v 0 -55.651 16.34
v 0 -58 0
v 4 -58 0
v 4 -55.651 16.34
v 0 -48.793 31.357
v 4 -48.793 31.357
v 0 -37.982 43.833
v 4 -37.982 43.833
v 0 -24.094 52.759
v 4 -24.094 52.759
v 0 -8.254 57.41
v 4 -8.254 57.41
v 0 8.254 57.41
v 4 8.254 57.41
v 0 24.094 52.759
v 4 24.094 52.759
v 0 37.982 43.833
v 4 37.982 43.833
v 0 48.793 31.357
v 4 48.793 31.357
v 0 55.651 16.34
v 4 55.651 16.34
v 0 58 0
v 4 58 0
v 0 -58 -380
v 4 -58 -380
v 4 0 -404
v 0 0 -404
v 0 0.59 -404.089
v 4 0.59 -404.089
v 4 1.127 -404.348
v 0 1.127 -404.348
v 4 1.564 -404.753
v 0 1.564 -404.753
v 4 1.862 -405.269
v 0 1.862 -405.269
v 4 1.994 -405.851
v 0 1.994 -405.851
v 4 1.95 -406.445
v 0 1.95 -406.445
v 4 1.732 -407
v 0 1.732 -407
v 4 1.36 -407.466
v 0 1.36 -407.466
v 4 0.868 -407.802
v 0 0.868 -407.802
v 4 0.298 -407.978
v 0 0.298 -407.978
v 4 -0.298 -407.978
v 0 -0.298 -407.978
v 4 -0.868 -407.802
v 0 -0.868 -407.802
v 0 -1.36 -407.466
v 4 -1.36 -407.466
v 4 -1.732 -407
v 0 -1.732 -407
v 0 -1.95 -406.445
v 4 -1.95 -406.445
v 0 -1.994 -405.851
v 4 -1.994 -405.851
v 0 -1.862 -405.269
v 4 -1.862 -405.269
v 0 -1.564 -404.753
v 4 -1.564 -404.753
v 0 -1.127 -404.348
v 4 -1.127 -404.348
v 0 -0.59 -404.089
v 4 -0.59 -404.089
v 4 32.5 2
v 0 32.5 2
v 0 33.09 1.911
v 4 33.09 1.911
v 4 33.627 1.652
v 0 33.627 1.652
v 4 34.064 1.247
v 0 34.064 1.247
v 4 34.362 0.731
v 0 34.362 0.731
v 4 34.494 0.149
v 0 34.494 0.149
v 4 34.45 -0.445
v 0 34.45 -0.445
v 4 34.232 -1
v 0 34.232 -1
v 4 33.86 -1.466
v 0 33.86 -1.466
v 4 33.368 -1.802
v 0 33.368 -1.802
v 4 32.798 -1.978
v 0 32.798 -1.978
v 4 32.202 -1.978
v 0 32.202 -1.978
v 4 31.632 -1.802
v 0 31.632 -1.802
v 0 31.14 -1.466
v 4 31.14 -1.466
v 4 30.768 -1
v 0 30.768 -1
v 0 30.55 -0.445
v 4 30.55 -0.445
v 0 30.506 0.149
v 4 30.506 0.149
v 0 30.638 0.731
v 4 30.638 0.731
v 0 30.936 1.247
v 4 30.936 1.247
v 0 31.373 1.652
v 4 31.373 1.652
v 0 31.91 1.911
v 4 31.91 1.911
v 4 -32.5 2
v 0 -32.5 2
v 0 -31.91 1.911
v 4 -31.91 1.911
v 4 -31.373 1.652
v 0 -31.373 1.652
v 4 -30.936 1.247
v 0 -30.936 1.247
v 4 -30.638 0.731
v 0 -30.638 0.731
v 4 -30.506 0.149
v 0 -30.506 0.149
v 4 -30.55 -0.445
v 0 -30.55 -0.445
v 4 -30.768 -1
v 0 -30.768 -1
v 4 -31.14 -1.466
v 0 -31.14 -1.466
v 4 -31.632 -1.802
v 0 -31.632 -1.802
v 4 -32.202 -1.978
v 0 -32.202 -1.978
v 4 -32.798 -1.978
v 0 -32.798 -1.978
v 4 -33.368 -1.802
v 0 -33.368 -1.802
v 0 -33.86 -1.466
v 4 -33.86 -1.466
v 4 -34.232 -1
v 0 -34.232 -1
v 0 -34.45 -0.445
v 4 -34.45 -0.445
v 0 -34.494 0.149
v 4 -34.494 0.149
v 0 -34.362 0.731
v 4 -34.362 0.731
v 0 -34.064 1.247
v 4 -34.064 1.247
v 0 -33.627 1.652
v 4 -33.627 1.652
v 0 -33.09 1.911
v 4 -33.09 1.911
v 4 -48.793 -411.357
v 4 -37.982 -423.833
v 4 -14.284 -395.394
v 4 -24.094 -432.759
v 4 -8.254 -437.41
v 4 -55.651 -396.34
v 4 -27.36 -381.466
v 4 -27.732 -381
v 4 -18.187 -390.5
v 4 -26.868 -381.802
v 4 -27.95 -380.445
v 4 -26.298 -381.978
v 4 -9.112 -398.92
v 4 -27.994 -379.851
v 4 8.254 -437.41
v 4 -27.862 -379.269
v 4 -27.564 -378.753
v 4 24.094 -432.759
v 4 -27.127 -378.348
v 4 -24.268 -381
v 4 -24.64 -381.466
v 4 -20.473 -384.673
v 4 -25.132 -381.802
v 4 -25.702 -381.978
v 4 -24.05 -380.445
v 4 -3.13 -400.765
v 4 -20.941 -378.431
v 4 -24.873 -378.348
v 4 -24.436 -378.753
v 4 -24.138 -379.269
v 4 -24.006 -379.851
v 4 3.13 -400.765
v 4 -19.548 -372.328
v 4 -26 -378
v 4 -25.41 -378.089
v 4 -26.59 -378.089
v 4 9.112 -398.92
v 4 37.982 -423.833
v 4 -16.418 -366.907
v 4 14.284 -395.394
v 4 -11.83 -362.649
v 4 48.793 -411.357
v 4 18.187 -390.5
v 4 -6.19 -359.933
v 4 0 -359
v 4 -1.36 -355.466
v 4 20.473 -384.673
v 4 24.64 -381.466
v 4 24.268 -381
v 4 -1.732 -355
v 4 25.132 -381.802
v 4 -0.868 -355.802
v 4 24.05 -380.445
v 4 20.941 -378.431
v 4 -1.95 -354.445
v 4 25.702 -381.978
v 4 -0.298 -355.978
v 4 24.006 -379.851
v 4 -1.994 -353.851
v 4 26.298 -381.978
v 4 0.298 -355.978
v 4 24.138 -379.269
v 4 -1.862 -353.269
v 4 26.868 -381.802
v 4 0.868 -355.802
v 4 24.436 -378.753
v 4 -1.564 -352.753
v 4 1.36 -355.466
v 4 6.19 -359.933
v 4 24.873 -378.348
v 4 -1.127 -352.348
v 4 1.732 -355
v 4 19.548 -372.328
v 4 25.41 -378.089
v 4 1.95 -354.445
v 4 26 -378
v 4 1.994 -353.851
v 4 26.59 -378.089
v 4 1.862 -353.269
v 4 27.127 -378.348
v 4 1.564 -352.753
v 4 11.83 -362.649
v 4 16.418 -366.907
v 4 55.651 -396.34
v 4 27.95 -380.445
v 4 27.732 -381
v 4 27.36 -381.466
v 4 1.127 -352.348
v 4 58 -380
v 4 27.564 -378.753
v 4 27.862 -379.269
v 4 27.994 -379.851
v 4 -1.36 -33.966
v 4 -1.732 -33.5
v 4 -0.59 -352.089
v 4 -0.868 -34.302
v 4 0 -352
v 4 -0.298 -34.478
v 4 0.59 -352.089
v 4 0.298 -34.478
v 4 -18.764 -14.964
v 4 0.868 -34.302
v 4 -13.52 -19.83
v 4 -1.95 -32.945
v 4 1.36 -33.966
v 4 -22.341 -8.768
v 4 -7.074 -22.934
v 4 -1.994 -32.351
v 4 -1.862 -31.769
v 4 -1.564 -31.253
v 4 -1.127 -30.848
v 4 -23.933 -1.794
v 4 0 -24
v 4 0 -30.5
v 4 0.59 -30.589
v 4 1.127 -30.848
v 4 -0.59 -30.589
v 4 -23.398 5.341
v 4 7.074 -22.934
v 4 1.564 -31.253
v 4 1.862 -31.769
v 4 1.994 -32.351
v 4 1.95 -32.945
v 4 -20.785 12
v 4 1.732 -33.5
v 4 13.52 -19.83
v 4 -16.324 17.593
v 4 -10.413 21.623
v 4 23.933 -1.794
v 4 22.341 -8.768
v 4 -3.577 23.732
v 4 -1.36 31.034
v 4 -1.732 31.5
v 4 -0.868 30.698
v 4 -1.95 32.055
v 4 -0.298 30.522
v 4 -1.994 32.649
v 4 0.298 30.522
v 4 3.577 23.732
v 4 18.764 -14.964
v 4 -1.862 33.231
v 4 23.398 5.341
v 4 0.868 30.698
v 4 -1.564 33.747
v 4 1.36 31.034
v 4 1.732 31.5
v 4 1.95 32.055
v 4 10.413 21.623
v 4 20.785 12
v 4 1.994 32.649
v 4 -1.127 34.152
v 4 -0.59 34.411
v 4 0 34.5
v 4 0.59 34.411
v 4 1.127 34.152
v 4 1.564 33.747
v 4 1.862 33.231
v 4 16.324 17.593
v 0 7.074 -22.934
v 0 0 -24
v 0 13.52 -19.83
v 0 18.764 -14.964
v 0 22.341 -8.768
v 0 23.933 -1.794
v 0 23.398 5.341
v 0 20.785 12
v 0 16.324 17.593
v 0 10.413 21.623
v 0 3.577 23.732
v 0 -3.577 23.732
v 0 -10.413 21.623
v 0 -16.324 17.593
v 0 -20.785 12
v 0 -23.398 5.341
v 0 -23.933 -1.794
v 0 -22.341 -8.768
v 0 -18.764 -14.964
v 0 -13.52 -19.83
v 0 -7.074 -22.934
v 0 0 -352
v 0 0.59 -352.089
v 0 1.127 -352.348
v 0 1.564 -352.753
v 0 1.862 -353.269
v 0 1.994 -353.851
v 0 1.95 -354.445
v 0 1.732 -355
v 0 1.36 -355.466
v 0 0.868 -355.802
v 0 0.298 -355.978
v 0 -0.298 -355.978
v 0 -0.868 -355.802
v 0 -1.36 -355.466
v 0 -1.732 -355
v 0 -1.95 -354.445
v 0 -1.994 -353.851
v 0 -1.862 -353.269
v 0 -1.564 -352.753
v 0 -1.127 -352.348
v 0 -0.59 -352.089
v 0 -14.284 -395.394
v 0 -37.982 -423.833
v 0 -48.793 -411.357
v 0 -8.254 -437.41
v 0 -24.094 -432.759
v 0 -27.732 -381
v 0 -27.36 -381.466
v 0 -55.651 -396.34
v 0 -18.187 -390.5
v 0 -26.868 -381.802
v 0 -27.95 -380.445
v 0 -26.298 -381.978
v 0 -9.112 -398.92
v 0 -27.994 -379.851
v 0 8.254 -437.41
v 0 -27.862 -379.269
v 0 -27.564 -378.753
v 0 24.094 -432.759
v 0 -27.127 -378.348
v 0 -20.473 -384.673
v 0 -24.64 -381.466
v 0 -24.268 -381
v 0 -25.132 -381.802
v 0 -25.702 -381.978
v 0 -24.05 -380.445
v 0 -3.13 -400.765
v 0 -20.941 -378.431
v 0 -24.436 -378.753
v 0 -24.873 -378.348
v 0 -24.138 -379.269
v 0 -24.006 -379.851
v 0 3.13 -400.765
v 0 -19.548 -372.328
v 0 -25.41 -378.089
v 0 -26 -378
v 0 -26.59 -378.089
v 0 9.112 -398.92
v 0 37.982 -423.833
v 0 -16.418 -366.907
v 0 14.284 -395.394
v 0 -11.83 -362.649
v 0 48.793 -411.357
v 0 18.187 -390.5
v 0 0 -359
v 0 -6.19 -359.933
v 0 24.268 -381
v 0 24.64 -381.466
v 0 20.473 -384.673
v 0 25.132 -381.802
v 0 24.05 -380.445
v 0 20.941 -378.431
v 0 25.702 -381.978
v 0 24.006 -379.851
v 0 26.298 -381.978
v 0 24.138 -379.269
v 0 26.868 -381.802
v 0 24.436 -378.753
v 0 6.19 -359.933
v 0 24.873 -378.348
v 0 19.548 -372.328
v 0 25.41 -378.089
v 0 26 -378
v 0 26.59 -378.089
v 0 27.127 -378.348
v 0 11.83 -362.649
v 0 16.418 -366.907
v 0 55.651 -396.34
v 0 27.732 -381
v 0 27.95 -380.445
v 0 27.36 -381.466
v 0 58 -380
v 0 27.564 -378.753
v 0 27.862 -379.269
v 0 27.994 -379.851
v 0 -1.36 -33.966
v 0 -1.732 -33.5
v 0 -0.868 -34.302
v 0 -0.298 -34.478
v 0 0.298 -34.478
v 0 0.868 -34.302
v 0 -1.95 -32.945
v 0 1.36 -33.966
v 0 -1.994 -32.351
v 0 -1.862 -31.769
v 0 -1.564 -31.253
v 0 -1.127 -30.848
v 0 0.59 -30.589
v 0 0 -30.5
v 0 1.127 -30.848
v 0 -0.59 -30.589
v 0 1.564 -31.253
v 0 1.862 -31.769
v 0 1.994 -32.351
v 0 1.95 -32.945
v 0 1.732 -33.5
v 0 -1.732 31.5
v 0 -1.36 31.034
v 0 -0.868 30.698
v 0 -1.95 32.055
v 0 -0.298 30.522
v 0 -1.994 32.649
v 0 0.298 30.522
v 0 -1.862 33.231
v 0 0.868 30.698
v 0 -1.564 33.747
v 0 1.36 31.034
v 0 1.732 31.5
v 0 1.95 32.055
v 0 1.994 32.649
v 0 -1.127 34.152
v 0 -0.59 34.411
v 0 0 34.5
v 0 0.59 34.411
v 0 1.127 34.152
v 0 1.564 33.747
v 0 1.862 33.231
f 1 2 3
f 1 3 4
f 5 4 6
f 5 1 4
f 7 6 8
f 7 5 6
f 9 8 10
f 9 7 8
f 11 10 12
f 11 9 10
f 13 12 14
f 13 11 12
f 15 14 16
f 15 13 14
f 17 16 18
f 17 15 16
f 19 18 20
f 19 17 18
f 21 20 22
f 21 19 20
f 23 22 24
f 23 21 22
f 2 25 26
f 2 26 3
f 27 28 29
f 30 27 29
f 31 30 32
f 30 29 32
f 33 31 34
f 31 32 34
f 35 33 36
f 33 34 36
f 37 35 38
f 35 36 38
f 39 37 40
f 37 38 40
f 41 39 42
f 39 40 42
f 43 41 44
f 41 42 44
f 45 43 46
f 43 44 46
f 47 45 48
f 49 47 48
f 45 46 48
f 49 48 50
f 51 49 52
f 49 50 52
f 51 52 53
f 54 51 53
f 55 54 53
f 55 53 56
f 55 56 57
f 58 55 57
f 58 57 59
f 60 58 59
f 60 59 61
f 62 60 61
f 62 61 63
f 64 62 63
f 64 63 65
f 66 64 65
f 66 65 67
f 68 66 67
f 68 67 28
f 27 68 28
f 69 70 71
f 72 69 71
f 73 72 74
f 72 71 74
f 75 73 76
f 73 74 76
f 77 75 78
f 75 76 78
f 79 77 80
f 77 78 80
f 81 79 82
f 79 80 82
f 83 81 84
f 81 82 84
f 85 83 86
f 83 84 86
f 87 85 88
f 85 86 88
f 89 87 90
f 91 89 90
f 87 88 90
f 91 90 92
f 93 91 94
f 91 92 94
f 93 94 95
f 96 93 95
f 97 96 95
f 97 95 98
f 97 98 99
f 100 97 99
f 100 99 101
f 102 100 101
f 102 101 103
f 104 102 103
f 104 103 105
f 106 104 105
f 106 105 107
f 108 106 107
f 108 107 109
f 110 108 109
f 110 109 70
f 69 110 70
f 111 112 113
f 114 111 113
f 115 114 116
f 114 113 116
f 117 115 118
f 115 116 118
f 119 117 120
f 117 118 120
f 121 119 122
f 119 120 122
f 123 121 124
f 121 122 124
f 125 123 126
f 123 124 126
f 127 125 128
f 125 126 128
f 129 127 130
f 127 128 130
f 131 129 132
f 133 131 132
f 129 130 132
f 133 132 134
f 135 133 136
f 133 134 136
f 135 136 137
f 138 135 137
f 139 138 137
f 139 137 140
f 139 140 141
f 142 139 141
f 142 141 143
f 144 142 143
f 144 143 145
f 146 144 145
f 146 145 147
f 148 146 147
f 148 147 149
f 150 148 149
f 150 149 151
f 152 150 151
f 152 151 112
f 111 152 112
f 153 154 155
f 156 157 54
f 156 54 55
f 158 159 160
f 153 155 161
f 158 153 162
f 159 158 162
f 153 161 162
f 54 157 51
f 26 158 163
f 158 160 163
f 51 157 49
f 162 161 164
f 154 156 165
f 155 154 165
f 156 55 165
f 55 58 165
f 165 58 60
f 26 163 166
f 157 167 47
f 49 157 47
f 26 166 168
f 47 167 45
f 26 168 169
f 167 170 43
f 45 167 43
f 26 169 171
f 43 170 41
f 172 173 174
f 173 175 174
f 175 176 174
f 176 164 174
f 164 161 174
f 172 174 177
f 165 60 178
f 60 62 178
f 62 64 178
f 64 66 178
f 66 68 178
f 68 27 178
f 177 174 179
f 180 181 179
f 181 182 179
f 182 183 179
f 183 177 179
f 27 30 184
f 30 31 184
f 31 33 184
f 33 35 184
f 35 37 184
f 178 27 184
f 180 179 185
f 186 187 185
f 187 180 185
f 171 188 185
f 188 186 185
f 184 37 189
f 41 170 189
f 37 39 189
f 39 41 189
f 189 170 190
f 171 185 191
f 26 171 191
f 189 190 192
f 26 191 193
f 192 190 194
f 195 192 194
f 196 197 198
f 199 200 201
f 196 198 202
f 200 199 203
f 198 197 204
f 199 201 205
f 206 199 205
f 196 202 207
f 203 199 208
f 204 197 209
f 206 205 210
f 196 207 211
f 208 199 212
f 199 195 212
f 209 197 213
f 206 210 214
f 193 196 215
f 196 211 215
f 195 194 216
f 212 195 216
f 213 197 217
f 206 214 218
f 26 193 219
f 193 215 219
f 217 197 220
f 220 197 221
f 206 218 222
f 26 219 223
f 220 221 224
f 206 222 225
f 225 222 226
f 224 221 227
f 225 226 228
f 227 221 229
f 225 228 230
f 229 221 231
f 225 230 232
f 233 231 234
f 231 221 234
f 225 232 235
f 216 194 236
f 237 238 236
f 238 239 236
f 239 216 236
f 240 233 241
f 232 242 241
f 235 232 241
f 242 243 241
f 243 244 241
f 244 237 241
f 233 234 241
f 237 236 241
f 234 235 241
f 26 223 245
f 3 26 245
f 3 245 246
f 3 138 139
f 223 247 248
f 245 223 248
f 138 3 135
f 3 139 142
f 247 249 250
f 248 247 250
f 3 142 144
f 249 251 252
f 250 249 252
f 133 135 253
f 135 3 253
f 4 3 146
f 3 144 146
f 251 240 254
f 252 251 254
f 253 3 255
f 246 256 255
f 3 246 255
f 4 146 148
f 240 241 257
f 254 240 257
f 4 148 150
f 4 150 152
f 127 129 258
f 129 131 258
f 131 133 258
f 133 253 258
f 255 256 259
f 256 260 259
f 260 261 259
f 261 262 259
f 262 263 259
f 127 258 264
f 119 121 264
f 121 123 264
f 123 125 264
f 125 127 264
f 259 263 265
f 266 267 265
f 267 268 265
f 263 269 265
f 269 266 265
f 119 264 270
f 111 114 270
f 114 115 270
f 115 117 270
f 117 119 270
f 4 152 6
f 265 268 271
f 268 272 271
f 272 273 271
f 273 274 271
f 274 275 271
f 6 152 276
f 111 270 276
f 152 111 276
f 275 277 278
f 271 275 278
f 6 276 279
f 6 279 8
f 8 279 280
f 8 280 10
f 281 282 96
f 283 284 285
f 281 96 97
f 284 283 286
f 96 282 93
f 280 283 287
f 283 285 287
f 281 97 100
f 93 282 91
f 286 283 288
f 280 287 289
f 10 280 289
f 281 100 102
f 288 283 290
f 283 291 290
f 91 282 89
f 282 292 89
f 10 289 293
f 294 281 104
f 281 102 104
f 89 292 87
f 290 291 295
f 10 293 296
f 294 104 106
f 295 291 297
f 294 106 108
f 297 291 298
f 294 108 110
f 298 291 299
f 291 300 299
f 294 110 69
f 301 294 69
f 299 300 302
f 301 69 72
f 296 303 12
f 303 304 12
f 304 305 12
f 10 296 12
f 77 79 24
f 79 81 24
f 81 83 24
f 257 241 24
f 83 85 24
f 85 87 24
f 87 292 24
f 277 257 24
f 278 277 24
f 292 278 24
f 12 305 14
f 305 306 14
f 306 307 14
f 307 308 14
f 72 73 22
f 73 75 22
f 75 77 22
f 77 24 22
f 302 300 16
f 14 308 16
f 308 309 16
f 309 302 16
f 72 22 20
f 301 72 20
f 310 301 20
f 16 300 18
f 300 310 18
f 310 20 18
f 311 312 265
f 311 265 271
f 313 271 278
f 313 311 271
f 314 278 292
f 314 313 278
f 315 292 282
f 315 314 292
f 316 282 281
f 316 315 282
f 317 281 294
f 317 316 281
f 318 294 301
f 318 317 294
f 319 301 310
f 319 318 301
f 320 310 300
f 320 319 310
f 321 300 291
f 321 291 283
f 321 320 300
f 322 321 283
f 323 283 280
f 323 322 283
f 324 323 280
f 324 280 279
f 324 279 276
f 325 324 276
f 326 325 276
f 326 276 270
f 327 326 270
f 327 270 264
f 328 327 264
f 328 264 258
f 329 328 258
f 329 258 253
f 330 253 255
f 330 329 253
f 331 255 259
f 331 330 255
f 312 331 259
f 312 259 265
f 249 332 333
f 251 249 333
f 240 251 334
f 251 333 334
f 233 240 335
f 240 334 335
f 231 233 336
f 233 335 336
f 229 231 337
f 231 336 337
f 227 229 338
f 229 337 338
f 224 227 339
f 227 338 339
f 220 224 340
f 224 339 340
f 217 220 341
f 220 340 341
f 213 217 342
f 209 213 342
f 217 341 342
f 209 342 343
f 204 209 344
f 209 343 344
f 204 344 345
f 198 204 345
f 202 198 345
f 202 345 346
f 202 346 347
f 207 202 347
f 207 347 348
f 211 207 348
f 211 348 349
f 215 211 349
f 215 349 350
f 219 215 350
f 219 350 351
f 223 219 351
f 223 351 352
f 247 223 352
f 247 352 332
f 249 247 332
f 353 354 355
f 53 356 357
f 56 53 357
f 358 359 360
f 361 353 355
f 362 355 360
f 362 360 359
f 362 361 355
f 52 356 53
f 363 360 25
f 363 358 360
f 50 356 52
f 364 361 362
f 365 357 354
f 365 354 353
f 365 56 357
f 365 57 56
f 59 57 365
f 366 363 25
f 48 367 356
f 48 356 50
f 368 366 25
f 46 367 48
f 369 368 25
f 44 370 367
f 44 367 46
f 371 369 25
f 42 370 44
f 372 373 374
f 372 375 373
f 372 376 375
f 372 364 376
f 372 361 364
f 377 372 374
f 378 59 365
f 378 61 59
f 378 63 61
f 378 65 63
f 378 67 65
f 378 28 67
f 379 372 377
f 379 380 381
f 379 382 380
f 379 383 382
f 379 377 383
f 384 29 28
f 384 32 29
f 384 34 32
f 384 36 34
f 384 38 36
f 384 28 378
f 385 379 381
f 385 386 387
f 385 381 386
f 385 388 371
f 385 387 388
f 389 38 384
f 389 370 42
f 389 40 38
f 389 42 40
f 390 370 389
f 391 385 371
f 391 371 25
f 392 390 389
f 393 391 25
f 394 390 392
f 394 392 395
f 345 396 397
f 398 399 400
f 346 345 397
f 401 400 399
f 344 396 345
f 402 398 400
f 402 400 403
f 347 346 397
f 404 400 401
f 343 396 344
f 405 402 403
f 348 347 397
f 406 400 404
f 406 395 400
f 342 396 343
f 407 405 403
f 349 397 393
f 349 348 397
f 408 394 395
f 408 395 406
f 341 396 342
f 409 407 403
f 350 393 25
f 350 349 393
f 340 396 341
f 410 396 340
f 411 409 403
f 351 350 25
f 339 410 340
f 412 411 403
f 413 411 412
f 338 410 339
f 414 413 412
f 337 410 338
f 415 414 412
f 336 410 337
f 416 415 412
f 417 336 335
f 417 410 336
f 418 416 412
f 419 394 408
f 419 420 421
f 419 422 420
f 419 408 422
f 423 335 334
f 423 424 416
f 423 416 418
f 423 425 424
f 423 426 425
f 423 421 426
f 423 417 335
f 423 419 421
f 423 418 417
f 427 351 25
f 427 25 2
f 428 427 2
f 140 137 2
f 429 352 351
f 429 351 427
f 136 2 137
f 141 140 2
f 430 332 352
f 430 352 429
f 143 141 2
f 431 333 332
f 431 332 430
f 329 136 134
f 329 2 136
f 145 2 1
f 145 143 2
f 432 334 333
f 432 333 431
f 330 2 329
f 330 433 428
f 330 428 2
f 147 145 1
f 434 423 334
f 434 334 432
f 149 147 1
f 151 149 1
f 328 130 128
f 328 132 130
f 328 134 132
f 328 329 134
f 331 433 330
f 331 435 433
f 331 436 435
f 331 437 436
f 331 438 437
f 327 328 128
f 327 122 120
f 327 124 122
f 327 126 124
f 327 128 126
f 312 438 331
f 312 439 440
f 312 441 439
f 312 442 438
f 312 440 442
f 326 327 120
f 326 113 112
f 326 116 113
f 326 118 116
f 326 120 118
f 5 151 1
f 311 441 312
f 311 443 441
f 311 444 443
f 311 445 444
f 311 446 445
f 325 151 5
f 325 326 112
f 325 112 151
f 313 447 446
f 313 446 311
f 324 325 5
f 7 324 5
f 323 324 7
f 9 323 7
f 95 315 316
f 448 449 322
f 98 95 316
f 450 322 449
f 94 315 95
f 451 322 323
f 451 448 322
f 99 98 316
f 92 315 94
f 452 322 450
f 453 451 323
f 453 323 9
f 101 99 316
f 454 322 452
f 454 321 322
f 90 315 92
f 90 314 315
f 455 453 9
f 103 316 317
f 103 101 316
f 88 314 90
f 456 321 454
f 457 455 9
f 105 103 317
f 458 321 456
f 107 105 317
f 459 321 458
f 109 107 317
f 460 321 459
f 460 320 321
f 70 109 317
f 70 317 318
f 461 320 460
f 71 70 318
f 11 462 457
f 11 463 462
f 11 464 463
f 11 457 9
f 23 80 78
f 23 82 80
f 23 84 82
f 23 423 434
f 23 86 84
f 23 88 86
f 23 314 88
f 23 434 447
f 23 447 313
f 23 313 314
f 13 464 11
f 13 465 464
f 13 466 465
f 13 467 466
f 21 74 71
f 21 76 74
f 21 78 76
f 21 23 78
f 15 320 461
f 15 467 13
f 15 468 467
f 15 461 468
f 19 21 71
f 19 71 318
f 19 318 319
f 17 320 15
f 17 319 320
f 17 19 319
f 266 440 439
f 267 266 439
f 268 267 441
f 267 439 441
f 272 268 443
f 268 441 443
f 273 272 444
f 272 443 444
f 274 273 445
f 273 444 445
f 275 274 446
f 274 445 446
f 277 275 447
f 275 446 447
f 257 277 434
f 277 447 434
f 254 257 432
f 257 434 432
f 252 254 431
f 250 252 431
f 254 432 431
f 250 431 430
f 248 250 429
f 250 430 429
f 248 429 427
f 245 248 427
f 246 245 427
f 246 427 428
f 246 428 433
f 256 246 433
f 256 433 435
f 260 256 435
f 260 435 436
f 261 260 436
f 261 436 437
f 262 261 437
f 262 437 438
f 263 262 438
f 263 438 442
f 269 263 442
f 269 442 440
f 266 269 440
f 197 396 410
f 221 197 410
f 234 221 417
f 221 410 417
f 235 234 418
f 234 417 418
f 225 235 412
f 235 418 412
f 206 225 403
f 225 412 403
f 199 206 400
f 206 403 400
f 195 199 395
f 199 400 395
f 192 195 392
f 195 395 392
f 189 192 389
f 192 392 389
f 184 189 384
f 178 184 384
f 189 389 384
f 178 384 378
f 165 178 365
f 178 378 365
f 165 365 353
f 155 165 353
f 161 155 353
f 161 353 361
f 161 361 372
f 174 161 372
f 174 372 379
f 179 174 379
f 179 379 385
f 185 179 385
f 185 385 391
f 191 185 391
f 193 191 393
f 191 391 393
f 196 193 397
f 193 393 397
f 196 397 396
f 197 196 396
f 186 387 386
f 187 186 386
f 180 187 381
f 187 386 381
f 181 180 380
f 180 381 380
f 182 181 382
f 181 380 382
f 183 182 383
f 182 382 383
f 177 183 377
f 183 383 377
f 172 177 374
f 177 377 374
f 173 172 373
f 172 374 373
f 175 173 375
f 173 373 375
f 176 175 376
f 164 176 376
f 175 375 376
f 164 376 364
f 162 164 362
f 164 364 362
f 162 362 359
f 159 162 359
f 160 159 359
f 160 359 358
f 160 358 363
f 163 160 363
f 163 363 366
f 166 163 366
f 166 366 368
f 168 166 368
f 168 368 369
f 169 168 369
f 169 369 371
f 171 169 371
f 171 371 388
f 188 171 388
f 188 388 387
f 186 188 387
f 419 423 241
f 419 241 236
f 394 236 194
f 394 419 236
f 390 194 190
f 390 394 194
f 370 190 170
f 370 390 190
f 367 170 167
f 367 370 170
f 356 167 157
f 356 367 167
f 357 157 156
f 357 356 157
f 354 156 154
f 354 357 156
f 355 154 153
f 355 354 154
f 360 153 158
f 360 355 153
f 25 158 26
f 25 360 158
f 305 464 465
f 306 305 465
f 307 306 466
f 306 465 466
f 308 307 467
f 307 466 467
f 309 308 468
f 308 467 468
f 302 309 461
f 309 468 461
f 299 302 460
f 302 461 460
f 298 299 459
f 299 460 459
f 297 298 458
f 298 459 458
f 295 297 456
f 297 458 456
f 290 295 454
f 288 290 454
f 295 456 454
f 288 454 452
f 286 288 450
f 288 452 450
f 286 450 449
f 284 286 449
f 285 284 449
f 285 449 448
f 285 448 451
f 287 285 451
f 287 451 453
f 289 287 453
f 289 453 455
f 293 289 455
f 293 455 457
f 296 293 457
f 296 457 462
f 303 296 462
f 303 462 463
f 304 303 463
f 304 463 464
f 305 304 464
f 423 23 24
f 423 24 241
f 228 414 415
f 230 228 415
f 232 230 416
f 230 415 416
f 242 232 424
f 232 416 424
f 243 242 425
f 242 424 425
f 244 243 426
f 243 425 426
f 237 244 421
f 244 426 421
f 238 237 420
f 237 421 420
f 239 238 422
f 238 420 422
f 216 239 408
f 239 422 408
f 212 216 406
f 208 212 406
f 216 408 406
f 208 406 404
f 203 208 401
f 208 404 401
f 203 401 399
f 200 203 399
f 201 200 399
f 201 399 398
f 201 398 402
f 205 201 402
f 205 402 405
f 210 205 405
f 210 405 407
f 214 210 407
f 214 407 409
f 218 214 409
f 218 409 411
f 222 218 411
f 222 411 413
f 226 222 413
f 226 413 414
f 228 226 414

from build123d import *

# Parameters (mm, degrees)
SKETCH1_R           = 24
BOSS_EXTRUDE1_DEPTH = 4
SKETCH4_R           = 2
CUT_EXTRUDE3_DEPTH  = 442.841600576
SKETCH7_R           = 24
SKETCH7_R_2         = 21
BOSS_EXTRUDE3_DEPTH = 4
SKETCH8_R           = 2
CUT_EXTRUDE5_DEPTH  = 442.841600576


with BuildPart() as part:
    # Sketch1 → Boss-Extrude1 (new body)
    with BuildSketch(Plane(origin=(0, 0, 0), x_dir=(0, 0, -1), z_dir=(1, 0, 0))):
        with BuildLine():
            Line((0, 58), (380, 58))
            ThreePointArc((380, 58), (438, 0), (380, -58))
            Line((380, -58), (0, -58))
            ThreePointArc((0, -58), (-58, 0), (0, 58))
        make_face()
        Circle(SKETCH1_R, mode=Mode.SUBTRACT)
        with Locations((380, 0)):
            Circle(SKETCH1_R, mode=Mode.SUBTRACT)
    extrude(amount=BOSS_EXTRUDE1_DEPTH)

    # Sketch4 → Cut-Extrude3 (cut, through all)
    with BuildSketch(Plane.ZY):
        with Locations((0, 32.5)):
            Circle(SKETCH4_R)
        with Locations((32.5, 0)):
            Circle(SKETCH4_R)
        with Locations((0, -32.5)):
            Circle(SKETCH4_R)
        with Locations((-32.5, 0)):
            Circle(SKETCH4_R)
    extrude(amount=-CUT_EXTRUDE3_DEPTH, mode=Mode.SUBTRACT)

    # Sketch7 → Boss-Extrude3 (add)
    with BuildSketch(Plane.ZY):
        with Locations((-380, 0)):
            Circle(SKETCH7_R)
        with Locations((-380, 0)):
            Circle(SKETCH7_R_2, mode=Mode.SUBTRACT)
    extrude(amount=-BOSS_EXTRUDE3_DEPTH)

    # Sketch8 → Cut-Extrude5 (cut, through all)
    with BuildSketch(Plane.ZY):
        with Locations((-380, 26)):
            Circle(SKETCH8_R)
        with Locations((-354, 0)):
            Circle(SKETCH8_R)
        with Locations((-380, -26)):
            Circle(SKETCH8_R)
        with Locations((-406, 0)):
            Circle(SKETCH8_R)
    extrude(amount=-CUT_EXTRUDE5_DEPTH, mode=Mode.SUBTRACT)


solid = part.part
